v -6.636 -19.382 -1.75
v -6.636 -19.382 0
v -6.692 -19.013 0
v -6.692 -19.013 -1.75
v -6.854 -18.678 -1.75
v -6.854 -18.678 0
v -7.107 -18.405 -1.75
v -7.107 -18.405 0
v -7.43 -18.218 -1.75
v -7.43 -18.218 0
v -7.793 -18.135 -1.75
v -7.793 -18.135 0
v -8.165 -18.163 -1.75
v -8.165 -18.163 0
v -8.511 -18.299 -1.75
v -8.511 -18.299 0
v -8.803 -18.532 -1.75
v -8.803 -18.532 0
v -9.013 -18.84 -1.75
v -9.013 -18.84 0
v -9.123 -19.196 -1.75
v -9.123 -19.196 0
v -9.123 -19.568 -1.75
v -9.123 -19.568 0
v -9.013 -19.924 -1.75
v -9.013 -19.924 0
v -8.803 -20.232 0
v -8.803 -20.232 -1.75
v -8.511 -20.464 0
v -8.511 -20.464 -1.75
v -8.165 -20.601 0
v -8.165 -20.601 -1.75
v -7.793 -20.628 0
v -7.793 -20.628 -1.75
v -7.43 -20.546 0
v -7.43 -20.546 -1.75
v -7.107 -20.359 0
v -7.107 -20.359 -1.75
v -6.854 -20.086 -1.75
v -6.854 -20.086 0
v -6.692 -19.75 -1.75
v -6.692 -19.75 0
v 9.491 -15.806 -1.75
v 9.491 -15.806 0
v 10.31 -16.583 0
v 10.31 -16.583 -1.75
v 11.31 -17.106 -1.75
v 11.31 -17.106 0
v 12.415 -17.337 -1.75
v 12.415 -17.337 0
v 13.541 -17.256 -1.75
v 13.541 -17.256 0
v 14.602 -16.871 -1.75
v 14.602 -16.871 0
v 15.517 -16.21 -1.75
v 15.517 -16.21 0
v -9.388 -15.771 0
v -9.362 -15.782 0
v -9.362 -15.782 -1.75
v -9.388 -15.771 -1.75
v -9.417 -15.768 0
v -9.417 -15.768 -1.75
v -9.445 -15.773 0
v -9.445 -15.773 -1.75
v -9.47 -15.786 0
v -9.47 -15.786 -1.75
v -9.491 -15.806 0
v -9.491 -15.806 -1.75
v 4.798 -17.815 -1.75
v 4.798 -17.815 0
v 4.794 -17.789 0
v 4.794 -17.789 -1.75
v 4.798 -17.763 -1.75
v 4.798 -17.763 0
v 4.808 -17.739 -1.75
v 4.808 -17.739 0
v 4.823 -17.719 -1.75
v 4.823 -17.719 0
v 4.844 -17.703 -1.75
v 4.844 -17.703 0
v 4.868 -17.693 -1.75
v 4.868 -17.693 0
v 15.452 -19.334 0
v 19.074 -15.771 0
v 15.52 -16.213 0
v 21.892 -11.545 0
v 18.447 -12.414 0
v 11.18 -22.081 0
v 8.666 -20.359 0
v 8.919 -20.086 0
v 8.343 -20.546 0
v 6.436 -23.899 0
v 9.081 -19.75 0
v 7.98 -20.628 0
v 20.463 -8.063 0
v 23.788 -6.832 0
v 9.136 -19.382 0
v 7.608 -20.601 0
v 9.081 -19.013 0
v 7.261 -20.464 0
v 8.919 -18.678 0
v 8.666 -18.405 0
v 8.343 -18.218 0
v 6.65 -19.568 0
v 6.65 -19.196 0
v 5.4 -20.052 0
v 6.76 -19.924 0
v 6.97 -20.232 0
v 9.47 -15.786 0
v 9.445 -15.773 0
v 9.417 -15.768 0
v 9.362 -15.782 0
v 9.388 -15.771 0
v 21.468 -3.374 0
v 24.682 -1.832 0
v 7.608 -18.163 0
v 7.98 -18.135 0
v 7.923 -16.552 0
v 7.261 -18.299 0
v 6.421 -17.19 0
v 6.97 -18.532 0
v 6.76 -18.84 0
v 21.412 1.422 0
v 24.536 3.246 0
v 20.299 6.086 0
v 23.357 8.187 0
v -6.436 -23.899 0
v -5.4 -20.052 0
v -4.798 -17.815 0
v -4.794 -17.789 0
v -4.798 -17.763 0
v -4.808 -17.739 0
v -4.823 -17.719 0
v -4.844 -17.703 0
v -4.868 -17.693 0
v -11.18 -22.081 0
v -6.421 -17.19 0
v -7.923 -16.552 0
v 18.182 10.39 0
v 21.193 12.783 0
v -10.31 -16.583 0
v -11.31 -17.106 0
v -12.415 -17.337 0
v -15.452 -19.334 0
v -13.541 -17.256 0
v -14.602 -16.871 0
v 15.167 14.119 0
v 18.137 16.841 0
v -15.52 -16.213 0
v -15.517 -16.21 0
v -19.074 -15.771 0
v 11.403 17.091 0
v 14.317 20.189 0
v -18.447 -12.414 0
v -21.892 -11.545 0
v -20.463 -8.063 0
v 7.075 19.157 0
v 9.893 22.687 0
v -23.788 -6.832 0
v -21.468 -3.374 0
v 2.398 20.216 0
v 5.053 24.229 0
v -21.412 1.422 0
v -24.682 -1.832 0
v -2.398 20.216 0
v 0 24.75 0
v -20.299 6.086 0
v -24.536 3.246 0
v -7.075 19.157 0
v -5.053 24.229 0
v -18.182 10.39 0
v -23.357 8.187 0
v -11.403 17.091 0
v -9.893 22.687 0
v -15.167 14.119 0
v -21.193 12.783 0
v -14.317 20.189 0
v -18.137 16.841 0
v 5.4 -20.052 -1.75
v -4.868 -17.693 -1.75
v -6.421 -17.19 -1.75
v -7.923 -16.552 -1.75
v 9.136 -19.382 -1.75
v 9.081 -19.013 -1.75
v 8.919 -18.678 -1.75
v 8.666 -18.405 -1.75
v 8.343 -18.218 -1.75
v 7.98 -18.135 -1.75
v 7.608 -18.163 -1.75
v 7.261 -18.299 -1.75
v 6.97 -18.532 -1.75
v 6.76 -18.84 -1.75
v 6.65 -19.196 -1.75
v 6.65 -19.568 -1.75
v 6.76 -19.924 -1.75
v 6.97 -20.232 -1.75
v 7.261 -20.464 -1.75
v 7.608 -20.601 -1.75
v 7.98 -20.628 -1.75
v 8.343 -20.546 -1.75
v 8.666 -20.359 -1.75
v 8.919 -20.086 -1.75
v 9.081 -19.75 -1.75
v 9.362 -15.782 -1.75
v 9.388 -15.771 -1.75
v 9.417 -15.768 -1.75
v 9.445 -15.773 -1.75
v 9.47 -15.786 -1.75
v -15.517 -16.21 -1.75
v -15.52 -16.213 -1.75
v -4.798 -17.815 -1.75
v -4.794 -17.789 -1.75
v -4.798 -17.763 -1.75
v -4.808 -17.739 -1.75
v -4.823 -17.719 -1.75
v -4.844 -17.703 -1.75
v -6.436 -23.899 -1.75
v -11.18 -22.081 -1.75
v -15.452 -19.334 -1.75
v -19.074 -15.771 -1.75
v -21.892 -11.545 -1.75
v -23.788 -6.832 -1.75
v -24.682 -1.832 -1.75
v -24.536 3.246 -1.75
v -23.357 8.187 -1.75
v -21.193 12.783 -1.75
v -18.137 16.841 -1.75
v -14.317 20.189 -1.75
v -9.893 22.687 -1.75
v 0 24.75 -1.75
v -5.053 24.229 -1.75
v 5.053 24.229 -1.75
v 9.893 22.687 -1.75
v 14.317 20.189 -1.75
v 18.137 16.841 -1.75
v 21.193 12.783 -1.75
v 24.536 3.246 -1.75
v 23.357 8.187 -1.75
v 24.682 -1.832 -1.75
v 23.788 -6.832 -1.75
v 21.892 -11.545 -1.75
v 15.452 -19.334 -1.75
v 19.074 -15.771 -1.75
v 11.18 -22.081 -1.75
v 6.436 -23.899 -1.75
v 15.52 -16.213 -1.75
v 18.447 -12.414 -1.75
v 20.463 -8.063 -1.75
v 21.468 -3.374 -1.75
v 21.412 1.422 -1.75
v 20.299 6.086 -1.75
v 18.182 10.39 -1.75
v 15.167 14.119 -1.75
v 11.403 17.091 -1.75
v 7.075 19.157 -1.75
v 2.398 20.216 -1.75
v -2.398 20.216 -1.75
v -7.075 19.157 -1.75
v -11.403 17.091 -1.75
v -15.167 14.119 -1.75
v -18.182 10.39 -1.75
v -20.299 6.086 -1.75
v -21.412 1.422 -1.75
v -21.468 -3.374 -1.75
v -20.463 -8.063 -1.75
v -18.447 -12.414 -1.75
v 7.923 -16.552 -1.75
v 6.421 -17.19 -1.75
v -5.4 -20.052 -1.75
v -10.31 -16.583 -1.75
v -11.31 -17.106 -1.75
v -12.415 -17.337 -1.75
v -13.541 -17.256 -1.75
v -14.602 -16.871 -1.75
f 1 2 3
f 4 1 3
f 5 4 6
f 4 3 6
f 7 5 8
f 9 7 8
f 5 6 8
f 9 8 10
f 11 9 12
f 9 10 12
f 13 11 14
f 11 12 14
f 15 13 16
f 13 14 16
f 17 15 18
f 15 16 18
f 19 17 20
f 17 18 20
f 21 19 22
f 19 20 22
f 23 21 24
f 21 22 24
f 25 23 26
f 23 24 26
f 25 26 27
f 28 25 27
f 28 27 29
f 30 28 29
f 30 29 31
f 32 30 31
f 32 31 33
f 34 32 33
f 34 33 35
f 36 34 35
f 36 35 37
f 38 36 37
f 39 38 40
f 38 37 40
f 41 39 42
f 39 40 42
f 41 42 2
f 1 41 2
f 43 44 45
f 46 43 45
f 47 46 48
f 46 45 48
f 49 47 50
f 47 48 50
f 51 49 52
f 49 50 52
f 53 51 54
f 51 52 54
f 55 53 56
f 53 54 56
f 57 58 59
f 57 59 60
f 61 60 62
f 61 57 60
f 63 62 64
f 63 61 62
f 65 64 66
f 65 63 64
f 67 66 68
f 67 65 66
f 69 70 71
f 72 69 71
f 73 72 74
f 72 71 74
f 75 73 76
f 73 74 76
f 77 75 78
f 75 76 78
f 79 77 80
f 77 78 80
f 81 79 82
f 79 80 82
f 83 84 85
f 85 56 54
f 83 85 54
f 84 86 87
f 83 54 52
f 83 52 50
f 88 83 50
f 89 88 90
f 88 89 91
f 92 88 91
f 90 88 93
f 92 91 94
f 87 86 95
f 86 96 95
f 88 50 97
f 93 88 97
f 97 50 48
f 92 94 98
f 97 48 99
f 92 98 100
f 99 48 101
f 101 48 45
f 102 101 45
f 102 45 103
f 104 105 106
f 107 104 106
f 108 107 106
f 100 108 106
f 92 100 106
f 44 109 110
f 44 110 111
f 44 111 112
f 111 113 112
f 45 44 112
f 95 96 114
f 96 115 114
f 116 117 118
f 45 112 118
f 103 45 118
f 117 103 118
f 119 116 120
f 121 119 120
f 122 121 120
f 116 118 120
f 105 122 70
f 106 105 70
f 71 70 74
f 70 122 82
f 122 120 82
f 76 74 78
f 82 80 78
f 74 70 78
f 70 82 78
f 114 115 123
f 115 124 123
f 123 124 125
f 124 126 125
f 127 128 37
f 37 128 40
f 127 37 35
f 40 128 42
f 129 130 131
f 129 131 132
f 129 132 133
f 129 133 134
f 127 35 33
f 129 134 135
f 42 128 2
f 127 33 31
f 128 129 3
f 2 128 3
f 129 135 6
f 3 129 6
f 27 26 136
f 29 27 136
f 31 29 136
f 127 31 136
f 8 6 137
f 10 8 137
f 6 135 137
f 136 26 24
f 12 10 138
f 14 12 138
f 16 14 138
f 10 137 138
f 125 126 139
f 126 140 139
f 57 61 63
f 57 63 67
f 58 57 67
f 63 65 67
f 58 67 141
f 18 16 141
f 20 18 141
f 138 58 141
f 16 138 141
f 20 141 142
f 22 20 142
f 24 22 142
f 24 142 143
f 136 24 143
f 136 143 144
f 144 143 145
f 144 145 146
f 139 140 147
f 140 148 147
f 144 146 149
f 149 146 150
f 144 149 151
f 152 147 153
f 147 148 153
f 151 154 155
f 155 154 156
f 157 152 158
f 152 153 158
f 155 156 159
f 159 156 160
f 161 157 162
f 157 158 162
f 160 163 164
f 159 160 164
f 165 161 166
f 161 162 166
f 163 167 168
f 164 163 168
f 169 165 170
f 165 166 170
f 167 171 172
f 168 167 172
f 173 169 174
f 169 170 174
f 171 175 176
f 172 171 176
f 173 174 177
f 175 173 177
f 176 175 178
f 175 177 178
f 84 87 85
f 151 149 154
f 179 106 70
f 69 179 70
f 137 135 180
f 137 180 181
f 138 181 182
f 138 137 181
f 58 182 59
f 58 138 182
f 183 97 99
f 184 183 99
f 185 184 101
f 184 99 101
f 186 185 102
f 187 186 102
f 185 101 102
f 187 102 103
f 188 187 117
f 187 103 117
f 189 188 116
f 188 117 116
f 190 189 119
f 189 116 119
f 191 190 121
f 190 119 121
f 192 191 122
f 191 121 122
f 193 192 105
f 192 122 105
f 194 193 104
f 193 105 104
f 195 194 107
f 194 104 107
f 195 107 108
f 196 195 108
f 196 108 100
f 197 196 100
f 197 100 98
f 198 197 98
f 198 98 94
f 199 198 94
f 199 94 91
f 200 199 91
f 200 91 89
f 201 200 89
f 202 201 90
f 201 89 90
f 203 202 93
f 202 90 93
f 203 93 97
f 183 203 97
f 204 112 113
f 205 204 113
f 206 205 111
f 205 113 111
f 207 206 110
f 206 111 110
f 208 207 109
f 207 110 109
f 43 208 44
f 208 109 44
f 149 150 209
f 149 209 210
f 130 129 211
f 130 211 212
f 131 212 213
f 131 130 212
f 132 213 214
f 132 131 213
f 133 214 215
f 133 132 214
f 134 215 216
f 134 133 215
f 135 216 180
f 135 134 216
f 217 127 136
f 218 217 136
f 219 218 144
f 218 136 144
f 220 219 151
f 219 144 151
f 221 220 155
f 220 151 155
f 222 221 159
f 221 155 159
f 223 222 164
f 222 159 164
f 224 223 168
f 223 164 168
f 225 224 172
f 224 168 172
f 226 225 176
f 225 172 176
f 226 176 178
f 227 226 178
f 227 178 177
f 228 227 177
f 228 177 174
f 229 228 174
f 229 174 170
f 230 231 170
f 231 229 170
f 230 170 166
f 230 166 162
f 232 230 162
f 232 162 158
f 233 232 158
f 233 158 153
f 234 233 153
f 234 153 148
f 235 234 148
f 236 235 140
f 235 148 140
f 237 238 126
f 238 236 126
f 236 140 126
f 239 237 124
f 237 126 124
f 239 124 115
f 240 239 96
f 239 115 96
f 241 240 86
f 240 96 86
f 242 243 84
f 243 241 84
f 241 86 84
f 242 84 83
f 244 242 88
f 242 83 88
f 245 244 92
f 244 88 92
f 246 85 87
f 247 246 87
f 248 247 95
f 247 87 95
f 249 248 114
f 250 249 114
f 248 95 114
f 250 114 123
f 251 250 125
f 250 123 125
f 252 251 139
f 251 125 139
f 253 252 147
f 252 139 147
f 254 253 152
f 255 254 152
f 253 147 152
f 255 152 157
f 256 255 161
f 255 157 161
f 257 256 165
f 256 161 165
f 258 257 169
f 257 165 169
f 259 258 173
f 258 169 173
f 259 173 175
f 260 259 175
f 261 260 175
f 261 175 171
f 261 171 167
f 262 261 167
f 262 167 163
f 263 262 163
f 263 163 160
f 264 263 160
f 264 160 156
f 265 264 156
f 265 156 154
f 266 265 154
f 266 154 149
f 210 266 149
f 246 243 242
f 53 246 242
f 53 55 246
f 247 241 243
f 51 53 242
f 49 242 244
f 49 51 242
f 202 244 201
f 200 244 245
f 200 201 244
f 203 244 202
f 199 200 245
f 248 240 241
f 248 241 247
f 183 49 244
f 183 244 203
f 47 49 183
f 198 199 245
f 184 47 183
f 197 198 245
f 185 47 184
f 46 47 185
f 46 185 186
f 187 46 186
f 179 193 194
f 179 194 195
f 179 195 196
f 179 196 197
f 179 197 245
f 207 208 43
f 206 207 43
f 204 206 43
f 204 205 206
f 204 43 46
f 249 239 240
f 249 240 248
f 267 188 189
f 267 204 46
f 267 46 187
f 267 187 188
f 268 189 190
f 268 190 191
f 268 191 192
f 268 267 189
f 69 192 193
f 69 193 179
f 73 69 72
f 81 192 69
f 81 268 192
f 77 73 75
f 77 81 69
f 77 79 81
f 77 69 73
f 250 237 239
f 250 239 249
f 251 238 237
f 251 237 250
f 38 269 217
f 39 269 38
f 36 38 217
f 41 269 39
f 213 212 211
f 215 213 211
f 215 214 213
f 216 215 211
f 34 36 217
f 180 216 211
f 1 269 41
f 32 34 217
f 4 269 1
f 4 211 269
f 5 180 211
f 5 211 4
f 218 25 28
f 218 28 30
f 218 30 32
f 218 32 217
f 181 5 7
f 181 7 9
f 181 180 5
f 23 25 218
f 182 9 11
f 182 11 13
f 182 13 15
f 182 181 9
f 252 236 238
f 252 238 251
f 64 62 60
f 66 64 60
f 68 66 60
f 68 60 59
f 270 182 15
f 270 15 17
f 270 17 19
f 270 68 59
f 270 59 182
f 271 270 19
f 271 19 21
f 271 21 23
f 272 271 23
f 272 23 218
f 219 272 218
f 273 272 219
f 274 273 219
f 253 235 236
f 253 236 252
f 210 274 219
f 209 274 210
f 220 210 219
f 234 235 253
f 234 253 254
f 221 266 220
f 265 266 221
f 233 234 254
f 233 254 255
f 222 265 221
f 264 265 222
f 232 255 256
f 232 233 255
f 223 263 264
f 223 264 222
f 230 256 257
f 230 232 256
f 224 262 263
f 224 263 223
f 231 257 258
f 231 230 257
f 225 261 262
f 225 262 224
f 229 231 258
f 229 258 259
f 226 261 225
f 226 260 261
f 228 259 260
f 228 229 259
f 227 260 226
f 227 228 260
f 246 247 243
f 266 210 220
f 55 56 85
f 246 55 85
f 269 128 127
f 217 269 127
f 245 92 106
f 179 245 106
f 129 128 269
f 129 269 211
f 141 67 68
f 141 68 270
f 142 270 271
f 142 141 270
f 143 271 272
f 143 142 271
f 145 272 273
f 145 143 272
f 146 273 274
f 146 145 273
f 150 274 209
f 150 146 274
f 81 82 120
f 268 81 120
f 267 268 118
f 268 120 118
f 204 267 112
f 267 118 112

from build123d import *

# Parameters (mm, degrees)
BODYSKE_R    = 1.25
BODY_DEPTH   = 1.75
MODLUGSKE_R  = 1.25
MODLUG_DEPTH = 1.75


with BuildPart() as part:
    # BodySke → Body (new body)
    with BuildSketch(Plane.XY):
        with BuildLine():
            Line((6.436111652, -23.898513904), (5.400081715, -20.051536536))
            ThreePointArc((5.400081715, -20.051536536), (6.699668105, -17.096735495), (9.864304114, -17.733016019))
            ThreePointArc((9.864304114, -17.733016019), (11.581275555, -18.645865936), (13.446997724, -18.097808741))
            ThreePointArc((13.446997724, -18.097808741), (0, 20.35), (-13.446997724, -18.097808741))
            ThreePointArc((-13.446997724, -18.097808741), (-11.581275555, -18.645865936), (-9.864304114, -17.733016019))
            ThreePointArc((-9.864304114, -17.733016019), (-6.699668105, -17.096735495), (-5.400081715, -20.051536536))
            Line((-5.400081715, -20.051536536), (-6.436111652, -23.898513904))
            ThreePointArc((-6.436111652, -23.898513904), (0, 24.75), (6.436111652, -23.898513904))
        make_face()
        with Locations((7.886492758, -19.38192088)):
            Circle(BODYSKE_R, mode=Mode.SUBTRACT)
        with Locations((-7.886492758, -19.38192088)):
            Circle(BODYSKE_R, mode=Mode.SUBTRACT)
    extrude(amount=-BODY_DEPTH)

    # ModLugSke → ModLug (add, through all)
    # profile 1 of 2: a face of its own
    with BuildSketch(Plane.XY):
        with BuildLine():
            Line((6.436111652, -23.898513904), (4.797758213, -17.814994138))
            ThreePointArc((4.797758213, -17.814994138), (4.807517042, -17.739334665), (4.867790397, -17.692572358))
            ThreePointArc((4.867790397, -17.692572358), (7.17874809, -16.887512424), (9.362030953, -15.78210621))
            ThreePointArc((9.362030953, -15.78210621), (9.431060859, -15.76974753), (9.491233364, -15.805763285))
            ThreePointArc((9.491233364, -15.805763285), (12.415098782, -17.336547673), (15.517305658, -16.210225194))
            Line((15.517305658, -16.210225194), (17.114597599, -17.878843615))
            ThreePointArc((17.114597599, -17.878843615), (12.153932868, -21.56025083), (6.436111652, -23.898513904))
        make_face()
        with Locations((7.886492758, -19.38192088)):
            Circle(MODLUGSKE_R, mode=Mode.SUBTRACT)
    # profile 2 of 2: a face of its own
    with BuildSketch(Plane.XY):
        with BuildLine():
            Line((-6.436111652, -23.898513904), (-4.797758213, -17.814994138))
            ThreePointArc((-4.797758213, -17.814994138), (-4.807517042, -17.739334665), (-4.867790397, -17.692572358))
            ThreePointArc((-4.867790397, -17.692572358), (-7.17874809, -16.887512424), (-9.362030953, -15.78210621))
            ThreePointArc((-9.362030953, -15.78210621), (-9.431060859, -15.76974753), (-9.491233364, -15.805763285))
            ThreePointArc((-9.491233364, -15.805763285), (-12.415098782, -17.336547673), (-15.517305658, -16.210225194))
            Line((-15.517305658, -16.210225194), (-17.114597599, -17.878843615))
            ThreePointArc((-17.114597599, -17.878843615), (-12.153932868, -21.56025083), (-6.436111652, -23.898513904))
        make_face()
        with Locations((-7.886492758, -19.38192088)):
            Circle(MODLUGSKE_R, mode=Mode.SUBTRACT)
    extrude(amount=-MODLUG_DEPTH)


solid = part.part
